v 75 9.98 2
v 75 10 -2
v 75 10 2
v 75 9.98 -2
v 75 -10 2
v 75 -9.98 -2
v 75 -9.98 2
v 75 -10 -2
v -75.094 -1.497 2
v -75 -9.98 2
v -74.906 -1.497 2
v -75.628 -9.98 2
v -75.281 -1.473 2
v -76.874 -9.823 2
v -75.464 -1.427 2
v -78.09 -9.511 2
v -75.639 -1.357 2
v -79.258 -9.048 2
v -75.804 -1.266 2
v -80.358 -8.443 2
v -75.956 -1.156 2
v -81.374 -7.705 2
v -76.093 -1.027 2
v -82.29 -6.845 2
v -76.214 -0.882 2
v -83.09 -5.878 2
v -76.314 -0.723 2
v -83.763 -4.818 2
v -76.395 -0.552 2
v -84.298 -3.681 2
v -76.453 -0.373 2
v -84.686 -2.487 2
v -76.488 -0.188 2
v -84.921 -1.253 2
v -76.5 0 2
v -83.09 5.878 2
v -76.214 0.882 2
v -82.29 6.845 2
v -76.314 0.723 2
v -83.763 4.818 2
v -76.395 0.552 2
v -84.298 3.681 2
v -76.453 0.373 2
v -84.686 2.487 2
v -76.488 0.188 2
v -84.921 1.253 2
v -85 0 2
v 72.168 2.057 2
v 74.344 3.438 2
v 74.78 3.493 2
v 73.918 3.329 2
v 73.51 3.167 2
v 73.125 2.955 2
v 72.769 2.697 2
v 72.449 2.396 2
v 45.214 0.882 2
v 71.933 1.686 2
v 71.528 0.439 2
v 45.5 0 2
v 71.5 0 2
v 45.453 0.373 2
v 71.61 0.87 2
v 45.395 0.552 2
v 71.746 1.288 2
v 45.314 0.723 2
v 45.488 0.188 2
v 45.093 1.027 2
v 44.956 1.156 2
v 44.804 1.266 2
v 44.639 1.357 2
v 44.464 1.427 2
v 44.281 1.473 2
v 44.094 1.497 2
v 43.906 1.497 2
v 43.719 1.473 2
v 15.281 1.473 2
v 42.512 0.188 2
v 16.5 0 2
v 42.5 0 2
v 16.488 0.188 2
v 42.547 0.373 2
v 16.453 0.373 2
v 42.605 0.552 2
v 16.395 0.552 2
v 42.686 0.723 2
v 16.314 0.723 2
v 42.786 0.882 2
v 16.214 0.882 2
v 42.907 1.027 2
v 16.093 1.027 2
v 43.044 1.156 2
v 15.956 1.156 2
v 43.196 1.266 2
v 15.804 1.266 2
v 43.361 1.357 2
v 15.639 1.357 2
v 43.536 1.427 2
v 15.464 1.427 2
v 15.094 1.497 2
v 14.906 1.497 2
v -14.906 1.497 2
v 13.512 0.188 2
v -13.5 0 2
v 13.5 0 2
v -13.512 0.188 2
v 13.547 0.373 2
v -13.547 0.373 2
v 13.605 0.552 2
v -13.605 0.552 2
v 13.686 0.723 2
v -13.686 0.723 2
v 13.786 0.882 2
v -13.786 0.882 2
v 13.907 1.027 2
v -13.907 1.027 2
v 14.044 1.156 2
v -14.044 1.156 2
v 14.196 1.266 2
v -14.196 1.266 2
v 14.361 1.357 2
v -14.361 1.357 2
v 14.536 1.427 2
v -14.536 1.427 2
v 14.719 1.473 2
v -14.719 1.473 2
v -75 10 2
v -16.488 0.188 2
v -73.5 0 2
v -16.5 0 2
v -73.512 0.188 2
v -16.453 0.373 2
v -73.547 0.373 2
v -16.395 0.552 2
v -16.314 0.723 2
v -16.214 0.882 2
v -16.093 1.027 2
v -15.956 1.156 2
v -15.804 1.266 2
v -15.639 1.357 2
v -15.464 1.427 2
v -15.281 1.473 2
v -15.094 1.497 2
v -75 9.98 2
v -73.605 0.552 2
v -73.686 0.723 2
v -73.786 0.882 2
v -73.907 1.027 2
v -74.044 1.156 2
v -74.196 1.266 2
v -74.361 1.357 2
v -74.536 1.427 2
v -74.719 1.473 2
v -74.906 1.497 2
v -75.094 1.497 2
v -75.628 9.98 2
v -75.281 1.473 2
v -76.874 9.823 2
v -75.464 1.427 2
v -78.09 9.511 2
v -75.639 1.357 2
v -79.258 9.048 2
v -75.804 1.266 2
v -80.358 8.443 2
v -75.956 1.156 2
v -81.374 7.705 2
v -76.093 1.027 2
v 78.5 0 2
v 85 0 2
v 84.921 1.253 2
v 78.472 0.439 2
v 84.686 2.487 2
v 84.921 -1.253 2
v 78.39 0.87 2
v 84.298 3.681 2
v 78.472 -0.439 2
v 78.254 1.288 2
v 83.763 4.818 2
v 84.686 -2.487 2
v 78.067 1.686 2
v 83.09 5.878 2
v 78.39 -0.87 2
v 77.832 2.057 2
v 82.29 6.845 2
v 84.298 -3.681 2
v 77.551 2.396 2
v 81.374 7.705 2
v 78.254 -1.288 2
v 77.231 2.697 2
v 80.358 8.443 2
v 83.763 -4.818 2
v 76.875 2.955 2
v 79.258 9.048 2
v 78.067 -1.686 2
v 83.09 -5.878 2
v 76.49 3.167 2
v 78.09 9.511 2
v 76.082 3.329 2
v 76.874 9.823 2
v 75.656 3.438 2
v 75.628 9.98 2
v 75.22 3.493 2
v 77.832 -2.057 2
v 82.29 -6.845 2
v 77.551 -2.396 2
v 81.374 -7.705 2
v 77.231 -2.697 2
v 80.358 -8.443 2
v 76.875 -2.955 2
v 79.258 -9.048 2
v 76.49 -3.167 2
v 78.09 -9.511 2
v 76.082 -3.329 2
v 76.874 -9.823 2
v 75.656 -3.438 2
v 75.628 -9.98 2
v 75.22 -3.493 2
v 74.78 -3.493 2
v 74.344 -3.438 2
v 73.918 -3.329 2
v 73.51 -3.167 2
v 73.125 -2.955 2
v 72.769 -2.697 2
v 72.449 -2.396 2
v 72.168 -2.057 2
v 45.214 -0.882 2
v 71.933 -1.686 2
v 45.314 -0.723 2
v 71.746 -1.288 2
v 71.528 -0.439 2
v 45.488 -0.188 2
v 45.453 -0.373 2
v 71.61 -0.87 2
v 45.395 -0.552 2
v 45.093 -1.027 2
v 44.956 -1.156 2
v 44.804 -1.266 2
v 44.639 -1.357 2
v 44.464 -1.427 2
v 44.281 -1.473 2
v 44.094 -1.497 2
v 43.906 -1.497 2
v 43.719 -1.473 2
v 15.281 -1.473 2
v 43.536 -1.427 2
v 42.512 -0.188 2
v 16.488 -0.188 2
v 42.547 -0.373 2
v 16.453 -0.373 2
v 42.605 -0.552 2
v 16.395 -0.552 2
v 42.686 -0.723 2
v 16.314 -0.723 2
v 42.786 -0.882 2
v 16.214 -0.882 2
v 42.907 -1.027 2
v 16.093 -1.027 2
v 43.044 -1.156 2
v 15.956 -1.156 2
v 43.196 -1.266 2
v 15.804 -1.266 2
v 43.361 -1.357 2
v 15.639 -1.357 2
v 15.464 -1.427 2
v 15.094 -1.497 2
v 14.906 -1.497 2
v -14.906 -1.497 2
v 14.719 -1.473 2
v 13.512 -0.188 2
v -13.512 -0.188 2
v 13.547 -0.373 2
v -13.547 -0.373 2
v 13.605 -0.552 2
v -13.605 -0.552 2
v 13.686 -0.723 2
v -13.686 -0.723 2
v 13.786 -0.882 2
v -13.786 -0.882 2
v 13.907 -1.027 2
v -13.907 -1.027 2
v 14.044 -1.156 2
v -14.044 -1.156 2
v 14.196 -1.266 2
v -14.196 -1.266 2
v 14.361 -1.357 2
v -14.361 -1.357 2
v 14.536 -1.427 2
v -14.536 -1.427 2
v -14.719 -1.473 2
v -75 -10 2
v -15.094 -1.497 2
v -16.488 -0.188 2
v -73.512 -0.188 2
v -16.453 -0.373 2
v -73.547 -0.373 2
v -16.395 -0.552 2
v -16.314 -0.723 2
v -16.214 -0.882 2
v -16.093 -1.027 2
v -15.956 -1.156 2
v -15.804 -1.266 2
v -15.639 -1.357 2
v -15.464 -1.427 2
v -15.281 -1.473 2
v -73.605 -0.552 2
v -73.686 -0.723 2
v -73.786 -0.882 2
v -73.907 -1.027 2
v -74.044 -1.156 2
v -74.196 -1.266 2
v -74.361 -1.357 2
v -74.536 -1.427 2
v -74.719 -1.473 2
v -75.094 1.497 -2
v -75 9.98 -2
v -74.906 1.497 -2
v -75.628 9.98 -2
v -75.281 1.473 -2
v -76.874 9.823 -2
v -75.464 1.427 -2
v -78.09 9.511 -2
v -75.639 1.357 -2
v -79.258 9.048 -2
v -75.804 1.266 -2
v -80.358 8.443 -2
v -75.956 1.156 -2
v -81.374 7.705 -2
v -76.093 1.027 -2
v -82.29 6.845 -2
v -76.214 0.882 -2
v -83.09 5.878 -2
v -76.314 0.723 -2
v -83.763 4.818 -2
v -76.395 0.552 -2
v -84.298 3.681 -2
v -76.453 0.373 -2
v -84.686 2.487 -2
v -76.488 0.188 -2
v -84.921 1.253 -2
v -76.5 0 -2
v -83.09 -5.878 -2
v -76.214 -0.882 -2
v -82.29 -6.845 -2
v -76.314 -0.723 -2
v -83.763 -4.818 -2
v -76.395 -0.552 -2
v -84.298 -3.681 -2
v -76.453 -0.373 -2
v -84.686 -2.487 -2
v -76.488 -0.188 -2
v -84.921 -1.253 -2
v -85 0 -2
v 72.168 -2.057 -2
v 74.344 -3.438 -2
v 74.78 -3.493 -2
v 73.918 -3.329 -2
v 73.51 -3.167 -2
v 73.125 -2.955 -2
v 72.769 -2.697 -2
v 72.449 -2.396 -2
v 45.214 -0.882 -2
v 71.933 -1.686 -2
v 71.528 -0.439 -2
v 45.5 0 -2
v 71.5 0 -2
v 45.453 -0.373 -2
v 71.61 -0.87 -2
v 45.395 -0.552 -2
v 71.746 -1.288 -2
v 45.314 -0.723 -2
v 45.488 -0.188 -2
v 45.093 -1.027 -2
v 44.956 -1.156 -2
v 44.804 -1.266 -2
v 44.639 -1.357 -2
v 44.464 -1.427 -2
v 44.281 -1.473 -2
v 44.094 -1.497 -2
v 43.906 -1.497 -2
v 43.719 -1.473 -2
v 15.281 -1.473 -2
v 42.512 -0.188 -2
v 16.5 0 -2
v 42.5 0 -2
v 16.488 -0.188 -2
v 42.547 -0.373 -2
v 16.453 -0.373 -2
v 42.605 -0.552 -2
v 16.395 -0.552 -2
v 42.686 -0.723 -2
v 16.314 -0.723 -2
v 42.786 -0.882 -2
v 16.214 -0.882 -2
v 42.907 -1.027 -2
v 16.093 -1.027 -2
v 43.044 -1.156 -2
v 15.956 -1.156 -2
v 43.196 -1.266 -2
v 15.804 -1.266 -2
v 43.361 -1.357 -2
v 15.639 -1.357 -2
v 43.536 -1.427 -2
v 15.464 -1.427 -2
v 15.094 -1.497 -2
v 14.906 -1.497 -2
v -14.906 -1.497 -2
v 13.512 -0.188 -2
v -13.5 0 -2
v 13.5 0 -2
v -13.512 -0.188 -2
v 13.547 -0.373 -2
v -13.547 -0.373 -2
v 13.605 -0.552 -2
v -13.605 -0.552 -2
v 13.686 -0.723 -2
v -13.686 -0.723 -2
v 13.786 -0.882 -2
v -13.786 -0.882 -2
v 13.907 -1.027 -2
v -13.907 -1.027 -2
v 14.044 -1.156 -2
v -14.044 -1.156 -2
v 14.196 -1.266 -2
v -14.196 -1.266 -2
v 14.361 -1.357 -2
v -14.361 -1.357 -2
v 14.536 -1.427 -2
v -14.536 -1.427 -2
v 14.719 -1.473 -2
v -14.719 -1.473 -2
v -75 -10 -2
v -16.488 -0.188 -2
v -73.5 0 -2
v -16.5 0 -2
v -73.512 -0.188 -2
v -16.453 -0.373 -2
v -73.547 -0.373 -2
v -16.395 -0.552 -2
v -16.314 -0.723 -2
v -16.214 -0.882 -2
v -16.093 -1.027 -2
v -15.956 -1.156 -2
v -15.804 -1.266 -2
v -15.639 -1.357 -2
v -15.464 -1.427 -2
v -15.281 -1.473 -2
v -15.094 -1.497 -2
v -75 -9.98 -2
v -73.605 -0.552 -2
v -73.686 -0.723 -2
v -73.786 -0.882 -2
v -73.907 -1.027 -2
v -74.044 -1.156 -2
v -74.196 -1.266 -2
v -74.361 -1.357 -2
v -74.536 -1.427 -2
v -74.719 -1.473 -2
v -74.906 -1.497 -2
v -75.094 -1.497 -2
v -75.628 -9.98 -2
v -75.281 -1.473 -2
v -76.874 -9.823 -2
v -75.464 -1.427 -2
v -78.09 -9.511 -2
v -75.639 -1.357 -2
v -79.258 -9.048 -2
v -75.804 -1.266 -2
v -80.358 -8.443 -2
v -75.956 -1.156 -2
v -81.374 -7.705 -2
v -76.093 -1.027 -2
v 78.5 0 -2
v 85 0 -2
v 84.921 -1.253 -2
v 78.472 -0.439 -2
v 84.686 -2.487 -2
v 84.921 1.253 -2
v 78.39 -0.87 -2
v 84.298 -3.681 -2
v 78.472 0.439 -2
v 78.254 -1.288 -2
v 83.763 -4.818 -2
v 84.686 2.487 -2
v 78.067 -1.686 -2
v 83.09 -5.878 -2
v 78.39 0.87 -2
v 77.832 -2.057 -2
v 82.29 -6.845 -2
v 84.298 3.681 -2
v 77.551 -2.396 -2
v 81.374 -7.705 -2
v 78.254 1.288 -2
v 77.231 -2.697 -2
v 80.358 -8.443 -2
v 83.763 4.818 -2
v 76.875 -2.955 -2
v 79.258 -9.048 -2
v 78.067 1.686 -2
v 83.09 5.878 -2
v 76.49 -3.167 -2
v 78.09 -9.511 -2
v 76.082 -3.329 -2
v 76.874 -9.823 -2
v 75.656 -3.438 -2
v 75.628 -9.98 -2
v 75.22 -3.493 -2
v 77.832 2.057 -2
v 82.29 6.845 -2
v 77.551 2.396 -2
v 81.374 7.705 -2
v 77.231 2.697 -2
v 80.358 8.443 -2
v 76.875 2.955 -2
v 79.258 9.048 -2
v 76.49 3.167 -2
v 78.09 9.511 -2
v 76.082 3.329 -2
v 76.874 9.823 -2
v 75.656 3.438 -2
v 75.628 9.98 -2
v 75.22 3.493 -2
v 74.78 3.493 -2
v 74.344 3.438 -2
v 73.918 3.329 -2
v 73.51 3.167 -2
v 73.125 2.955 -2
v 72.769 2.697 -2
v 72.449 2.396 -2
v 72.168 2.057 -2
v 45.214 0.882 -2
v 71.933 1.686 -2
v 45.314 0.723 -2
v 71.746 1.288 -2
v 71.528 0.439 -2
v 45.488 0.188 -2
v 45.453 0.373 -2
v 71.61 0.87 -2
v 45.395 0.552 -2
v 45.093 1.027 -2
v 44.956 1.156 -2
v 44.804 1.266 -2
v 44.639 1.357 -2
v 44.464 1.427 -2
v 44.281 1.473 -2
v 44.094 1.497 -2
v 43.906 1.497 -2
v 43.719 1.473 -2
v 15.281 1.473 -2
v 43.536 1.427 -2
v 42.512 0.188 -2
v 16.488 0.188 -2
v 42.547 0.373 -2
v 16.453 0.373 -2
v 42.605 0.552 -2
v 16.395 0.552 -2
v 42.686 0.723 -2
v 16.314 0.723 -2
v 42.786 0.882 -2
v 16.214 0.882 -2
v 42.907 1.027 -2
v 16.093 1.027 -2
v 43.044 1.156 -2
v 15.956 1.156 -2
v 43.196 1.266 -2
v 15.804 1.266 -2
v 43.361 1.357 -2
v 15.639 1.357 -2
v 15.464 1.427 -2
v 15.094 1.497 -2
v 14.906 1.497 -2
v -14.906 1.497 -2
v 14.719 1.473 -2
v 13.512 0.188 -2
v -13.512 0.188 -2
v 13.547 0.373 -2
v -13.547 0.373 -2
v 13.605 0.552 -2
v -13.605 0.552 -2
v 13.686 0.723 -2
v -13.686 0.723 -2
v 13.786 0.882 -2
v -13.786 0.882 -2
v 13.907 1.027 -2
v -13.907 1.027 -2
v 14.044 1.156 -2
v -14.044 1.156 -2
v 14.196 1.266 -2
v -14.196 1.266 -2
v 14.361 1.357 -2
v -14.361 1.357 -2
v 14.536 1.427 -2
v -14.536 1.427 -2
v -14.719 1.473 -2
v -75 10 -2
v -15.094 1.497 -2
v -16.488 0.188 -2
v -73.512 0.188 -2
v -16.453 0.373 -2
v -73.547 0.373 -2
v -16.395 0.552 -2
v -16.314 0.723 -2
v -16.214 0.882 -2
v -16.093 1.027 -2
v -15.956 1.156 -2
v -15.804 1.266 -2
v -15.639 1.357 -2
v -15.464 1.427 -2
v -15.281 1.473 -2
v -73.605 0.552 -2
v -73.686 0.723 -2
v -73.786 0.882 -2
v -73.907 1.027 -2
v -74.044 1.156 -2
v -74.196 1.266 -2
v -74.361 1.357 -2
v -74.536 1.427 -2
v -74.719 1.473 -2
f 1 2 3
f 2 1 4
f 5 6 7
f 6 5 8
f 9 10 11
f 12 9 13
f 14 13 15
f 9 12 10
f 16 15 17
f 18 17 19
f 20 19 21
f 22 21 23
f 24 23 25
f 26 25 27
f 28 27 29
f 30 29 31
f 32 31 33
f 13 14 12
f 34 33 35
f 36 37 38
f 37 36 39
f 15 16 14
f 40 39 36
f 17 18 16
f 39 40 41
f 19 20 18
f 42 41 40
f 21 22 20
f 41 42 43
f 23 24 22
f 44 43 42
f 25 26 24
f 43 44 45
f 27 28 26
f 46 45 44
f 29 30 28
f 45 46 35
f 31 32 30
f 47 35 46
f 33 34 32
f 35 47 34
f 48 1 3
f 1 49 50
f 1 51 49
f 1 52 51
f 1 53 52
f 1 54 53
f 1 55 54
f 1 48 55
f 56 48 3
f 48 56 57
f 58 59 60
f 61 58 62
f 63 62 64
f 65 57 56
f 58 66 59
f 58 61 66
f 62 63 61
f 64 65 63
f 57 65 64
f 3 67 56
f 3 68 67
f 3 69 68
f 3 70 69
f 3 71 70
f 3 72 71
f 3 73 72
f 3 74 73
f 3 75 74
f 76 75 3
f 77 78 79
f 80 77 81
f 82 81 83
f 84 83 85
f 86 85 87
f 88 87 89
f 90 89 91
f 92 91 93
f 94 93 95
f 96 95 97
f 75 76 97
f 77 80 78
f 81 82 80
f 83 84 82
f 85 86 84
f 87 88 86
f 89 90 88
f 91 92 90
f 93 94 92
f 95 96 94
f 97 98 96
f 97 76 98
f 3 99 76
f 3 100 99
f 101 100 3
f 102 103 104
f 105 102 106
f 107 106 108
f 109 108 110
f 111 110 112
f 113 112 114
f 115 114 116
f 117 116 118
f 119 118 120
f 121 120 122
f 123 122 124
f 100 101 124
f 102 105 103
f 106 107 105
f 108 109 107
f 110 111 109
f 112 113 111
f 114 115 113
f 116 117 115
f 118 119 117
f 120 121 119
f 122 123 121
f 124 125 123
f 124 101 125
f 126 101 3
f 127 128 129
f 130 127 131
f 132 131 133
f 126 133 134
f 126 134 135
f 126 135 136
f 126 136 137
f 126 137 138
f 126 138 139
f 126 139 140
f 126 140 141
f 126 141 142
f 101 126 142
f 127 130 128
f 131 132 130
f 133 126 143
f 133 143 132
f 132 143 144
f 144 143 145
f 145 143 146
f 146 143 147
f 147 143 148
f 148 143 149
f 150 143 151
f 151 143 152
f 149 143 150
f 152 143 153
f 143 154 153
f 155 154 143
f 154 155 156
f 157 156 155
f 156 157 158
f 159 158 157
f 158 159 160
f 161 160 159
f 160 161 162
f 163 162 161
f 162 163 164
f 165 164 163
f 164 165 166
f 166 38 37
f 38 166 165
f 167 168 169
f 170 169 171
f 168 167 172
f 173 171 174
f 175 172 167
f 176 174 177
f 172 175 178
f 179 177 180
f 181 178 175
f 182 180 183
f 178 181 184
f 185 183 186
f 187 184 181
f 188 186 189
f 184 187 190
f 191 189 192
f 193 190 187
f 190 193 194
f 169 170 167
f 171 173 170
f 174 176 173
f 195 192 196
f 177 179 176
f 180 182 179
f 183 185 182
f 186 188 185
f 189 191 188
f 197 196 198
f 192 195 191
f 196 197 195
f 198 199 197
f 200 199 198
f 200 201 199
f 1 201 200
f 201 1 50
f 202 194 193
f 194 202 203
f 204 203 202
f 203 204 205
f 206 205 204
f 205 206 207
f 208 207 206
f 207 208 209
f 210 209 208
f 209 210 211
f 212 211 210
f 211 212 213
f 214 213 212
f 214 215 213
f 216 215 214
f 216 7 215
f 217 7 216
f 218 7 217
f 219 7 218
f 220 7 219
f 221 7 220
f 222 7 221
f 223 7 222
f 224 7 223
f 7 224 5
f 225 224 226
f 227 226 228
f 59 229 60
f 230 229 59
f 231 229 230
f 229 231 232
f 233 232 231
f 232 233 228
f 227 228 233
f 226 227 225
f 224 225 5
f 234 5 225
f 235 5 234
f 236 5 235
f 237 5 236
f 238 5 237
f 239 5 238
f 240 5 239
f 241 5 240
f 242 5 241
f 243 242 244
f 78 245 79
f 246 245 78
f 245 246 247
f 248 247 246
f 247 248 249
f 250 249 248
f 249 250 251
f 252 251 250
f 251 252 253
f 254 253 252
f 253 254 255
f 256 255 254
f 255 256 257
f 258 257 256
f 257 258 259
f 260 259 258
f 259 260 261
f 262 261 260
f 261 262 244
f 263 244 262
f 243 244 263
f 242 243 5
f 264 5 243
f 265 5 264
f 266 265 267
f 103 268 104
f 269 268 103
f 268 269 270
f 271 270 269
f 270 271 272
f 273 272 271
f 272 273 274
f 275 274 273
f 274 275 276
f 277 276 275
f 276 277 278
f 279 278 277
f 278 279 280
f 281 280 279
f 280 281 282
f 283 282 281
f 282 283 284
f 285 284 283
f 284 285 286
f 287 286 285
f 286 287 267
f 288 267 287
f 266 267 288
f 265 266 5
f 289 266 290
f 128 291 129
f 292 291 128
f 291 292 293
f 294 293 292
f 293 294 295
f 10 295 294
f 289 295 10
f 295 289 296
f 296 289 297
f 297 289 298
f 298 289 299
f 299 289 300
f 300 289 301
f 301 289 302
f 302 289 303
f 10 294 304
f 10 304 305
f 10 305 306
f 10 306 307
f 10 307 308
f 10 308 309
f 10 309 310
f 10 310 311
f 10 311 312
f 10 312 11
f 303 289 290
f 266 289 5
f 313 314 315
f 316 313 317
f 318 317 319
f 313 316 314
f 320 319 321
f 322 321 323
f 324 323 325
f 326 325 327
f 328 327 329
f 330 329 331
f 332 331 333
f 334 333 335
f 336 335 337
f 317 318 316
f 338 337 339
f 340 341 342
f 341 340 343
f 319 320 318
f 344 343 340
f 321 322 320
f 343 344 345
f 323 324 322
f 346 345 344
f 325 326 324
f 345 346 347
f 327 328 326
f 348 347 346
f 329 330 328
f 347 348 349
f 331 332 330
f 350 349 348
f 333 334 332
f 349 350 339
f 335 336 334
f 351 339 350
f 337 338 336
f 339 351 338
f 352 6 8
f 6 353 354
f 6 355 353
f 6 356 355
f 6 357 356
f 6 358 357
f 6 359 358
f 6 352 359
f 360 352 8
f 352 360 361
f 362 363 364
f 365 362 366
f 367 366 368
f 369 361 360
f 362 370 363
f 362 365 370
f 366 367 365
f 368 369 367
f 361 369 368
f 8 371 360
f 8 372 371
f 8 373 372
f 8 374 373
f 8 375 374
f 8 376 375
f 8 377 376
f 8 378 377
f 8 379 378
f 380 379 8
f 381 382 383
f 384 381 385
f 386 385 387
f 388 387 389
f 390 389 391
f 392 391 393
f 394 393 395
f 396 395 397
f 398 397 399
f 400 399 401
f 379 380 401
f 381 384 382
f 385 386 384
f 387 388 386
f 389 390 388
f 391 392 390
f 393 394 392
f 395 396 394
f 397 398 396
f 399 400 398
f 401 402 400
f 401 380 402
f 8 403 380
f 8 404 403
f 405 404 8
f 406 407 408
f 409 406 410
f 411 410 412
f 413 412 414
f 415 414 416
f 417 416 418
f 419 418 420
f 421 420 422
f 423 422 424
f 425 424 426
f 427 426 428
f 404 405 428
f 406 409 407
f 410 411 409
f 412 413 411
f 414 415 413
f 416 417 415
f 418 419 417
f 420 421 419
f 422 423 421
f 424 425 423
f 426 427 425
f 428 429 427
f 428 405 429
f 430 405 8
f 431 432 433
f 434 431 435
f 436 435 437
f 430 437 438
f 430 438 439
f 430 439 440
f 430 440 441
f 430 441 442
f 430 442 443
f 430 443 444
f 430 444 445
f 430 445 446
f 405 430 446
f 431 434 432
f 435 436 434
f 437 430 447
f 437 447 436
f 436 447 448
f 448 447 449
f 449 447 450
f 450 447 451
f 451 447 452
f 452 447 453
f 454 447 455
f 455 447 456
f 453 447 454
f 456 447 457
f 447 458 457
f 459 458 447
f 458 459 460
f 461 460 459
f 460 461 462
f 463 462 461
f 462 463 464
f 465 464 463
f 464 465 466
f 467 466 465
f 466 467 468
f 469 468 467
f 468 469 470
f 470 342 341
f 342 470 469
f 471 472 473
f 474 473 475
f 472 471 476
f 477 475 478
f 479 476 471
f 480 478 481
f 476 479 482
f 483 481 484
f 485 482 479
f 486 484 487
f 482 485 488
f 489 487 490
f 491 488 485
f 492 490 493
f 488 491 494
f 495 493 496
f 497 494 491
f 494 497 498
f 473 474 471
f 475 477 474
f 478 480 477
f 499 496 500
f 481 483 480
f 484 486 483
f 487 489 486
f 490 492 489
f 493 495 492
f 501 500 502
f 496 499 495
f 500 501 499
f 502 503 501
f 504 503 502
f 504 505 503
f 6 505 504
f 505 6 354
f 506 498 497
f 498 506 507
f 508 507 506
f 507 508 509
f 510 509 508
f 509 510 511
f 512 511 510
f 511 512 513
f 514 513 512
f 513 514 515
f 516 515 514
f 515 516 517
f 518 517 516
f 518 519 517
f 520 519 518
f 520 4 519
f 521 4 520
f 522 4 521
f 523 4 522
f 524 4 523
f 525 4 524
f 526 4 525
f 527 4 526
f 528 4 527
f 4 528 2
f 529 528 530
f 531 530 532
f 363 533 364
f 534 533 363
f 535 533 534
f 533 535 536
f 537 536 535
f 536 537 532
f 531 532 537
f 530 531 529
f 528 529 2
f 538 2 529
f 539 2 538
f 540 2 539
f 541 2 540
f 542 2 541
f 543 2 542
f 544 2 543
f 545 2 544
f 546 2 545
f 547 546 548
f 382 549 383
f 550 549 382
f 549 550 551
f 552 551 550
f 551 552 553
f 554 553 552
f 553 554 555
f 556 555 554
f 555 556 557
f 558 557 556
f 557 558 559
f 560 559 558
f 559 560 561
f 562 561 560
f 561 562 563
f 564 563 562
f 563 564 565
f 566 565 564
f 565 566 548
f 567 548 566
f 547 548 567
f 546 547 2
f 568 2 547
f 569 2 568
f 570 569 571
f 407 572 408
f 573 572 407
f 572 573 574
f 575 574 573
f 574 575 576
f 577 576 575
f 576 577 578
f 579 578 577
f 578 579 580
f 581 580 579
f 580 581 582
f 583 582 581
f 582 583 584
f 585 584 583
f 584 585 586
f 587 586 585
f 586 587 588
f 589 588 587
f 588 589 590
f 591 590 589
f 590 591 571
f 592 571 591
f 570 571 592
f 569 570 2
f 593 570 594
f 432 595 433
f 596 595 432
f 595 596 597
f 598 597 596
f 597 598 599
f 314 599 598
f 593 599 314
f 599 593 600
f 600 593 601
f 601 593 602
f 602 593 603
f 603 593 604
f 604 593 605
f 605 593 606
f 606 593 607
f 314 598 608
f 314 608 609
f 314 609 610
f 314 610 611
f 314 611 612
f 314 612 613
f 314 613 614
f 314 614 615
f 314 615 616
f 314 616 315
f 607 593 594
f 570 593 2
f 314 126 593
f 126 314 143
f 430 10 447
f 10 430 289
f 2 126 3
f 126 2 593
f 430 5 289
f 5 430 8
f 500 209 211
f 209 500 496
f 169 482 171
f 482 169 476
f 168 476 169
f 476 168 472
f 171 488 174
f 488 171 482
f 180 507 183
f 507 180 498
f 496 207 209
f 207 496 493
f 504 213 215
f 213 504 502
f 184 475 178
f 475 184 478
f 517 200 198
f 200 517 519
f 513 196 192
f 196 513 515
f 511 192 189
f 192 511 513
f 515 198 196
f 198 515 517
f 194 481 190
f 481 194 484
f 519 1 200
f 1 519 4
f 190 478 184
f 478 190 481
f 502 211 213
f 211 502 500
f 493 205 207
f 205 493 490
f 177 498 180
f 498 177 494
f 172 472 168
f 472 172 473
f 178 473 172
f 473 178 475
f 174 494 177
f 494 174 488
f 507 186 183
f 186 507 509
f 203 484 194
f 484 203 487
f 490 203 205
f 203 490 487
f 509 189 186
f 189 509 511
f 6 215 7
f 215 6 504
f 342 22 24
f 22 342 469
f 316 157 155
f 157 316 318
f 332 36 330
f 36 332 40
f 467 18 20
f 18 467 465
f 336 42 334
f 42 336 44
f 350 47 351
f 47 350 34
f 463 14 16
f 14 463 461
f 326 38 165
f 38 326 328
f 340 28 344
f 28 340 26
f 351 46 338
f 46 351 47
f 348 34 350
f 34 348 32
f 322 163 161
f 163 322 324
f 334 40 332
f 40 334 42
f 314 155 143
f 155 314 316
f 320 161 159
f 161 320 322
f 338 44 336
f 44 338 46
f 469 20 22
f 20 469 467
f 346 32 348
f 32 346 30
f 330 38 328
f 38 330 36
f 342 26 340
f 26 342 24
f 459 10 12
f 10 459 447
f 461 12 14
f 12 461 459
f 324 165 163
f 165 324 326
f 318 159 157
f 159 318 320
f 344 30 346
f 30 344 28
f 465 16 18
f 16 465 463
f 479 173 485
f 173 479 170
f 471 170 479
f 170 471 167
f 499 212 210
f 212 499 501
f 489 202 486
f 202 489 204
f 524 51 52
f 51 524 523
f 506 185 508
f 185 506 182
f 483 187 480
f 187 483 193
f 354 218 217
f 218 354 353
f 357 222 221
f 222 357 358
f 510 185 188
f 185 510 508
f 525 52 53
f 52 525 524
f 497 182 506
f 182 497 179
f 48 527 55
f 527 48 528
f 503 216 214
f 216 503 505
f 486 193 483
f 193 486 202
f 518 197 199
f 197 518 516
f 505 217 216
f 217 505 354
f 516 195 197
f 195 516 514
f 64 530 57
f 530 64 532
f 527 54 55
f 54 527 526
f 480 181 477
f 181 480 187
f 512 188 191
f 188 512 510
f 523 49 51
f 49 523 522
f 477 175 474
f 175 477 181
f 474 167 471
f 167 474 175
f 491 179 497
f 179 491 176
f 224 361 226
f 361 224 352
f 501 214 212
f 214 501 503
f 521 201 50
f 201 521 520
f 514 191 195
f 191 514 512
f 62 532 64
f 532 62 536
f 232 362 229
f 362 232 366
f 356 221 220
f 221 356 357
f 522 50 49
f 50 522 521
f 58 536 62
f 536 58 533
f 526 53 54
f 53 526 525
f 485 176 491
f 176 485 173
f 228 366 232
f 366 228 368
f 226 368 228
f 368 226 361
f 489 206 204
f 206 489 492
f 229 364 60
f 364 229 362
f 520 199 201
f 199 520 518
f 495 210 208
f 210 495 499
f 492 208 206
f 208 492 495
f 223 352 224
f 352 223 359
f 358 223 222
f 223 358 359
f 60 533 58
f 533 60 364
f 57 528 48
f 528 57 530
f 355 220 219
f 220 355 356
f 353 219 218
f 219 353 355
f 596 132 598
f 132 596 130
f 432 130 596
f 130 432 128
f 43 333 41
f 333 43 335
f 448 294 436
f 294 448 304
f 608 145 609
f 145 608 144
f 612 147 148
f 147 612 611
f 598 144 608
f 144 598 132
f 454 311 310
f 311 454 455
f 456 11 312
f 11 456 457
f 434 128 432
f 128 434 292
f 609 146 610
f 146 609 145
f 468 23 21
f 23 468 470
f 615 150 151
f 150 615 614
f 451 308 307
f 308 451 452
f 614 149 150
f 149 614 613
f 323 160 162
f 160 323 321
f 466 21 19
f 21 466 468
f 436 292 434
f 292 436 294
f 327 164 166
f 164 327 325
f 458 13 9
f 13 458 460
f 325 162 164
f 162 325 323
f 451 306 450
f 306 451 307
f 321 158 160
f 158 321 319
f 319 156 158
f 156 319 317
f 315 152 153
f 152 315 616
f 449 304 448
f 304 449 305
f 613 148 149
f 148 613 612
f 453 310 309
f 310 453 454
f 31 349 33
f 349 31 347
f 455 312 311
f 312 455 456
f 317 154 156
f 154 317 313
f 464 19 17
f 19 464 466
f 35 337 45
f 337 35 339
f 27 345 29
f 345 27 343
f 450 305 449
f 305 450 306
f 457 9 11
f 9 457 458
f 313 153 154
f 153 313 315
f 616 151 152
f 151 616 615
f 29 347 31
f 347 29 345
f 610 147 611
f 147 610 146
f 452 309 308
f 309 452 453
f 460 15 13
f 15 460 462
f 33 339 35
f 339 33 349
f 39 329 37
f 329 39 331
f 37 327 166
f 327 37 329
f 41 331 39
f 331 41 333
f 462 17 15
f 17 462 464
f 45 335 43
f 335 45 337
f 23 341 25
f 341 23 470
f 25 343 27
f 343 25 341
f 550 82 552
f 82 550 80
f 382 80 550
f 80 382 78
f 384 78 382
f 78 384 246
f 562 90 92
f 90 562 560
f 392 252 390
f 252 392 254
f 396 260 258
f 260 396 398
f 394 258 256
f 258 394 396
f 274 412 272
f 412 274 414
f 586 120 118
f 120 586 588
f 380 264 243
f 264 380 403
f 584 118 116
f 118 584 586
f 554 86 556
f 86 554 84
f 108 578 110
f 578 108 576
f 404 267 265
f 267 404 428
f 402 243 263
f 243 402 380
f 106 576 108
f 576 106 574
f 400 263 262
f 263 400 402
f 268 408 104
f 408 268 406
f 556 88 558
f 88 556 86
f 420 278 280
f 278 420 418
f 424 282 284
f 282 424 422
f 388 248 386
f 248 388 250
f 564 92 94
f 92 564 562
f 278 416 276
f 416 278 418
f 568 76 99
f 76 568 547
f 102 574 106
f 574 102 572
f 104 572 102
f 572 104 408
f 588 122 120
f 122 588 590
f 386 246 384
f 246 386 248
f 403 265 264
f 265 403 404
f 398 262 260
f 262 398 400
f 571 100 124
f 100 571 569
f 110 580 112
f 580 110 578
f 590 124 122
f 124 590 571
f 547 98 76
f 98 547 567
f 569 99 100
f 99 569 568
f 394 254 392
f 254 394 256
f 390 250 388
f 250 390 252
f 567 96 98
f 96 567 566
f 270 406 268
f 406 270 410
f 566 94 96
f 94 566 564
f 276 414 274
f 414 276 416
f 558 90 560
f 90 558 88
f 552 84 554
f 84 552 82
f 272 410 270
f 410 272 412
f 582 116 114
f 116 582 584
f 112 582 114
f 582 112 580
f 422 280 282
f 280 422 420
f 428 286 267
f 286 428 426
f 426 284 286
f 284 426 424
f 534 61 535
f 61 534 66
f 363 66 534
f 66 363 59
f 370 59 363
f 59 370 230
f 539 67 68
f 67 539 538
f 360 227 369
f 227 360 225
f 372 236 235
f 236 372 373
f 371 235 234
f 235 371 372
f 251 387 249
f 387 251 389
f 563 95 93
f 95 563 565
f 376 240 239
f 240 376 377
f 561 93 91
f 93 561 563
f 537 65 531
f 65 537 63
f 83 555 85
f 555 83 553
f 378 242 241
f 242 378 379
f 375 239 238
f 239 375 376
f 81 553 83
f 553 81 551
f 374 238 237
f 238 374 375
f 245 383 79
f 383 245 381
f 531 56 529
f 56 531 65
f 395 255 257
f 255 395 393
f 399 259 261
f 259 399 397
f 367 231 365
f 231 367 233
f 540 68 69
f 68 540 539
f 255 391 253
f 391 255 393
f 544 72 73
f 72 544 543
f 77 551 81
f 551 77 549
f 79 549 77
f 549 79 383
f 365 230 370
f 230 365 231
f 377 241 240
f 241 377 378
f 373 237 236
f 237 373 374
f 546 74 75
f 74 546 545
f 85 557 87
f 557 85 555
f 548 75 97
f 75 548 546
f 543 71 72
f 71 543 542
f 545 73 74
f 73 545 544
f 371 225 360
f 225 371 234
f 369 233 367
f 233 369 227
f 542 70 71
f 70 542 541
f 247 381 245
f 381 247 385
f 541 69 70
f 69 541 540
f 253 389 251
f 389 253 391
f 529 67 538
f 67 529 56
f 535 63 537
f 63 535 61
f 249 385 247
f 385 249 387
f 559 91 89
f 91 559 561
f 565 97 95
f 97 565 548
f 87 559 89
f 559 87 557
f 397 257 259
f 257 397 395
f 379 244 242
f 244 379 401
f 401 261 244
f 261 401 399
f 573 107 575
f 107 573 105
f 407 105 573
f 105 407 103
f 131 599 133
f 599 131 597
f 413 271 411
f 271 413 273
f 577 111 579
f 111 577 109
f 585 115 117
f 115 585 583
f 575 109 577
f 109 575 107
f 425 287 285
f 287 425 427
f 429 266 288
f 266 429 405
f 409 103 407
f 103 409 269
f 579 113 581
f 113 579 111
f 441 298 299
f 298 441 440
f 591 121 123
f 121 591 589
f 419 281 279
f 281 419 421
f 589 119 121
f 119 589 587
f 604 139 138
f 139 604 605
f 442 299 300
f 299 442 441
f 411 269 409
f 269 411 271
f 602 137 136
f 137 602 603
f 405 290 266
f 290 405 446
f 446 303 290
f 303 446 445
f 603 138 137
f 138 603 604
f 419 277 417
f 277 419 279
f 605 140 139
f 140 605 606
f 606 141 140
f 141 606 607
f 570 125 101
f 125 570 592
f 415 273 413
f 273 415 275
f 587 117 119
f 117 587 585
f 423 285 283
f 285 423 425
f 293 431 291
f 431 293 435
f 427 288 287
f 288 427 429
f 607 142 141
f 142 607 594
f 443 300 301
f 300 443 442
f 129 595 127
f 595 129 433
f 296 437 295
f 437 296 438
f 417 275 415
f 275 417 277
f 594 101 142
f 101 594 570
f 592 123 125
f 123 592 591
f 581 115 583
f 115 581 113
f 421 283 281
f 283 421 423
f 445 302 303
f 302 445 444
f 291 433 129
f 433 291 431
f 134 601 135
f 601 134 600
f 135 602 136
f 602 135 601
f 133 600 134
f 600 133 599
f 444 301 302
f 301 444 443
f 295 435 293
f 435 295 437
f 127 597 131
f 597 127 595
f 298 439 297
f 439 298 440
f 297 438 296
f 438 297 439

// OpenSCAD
//Author: Piotr Paterek, Kraków 05-08.2016
$fn=50;
module cal()
{
cube([150,20,4], center=true);
translate([75,0,0])
                    {
                        cylinder(r=10, h=4, center=true);
                    }
translate([-75,0,0])
                    {
                        cylinder(r=10, h=4, center=true);
                    }
}
                    
difference()
{
    difference()
    {
        difference()
        {
            difference()
            {
                difference()
                {
                    cal();
                    translate([75,0,0])
                    {
                        cylinder(r=3.5, h=4, center=true);
                    }
                    translate([-75,0,0])
                    {
                        cylinder(r=1.5, h=4, center=true);
                    }
                }
            }
            translate([15,0,0])
             {
                    cylinder(r=1.5,h=4,center=true);
             }
        }
        translate([44,0,0])
                    {
                        cylinder(r=1.5, h=4, center=true);
                    }
    }
     translate([-15,0,0])
             {
                    cylinder(r=1.5,h=4,center=true);
             }
         }
